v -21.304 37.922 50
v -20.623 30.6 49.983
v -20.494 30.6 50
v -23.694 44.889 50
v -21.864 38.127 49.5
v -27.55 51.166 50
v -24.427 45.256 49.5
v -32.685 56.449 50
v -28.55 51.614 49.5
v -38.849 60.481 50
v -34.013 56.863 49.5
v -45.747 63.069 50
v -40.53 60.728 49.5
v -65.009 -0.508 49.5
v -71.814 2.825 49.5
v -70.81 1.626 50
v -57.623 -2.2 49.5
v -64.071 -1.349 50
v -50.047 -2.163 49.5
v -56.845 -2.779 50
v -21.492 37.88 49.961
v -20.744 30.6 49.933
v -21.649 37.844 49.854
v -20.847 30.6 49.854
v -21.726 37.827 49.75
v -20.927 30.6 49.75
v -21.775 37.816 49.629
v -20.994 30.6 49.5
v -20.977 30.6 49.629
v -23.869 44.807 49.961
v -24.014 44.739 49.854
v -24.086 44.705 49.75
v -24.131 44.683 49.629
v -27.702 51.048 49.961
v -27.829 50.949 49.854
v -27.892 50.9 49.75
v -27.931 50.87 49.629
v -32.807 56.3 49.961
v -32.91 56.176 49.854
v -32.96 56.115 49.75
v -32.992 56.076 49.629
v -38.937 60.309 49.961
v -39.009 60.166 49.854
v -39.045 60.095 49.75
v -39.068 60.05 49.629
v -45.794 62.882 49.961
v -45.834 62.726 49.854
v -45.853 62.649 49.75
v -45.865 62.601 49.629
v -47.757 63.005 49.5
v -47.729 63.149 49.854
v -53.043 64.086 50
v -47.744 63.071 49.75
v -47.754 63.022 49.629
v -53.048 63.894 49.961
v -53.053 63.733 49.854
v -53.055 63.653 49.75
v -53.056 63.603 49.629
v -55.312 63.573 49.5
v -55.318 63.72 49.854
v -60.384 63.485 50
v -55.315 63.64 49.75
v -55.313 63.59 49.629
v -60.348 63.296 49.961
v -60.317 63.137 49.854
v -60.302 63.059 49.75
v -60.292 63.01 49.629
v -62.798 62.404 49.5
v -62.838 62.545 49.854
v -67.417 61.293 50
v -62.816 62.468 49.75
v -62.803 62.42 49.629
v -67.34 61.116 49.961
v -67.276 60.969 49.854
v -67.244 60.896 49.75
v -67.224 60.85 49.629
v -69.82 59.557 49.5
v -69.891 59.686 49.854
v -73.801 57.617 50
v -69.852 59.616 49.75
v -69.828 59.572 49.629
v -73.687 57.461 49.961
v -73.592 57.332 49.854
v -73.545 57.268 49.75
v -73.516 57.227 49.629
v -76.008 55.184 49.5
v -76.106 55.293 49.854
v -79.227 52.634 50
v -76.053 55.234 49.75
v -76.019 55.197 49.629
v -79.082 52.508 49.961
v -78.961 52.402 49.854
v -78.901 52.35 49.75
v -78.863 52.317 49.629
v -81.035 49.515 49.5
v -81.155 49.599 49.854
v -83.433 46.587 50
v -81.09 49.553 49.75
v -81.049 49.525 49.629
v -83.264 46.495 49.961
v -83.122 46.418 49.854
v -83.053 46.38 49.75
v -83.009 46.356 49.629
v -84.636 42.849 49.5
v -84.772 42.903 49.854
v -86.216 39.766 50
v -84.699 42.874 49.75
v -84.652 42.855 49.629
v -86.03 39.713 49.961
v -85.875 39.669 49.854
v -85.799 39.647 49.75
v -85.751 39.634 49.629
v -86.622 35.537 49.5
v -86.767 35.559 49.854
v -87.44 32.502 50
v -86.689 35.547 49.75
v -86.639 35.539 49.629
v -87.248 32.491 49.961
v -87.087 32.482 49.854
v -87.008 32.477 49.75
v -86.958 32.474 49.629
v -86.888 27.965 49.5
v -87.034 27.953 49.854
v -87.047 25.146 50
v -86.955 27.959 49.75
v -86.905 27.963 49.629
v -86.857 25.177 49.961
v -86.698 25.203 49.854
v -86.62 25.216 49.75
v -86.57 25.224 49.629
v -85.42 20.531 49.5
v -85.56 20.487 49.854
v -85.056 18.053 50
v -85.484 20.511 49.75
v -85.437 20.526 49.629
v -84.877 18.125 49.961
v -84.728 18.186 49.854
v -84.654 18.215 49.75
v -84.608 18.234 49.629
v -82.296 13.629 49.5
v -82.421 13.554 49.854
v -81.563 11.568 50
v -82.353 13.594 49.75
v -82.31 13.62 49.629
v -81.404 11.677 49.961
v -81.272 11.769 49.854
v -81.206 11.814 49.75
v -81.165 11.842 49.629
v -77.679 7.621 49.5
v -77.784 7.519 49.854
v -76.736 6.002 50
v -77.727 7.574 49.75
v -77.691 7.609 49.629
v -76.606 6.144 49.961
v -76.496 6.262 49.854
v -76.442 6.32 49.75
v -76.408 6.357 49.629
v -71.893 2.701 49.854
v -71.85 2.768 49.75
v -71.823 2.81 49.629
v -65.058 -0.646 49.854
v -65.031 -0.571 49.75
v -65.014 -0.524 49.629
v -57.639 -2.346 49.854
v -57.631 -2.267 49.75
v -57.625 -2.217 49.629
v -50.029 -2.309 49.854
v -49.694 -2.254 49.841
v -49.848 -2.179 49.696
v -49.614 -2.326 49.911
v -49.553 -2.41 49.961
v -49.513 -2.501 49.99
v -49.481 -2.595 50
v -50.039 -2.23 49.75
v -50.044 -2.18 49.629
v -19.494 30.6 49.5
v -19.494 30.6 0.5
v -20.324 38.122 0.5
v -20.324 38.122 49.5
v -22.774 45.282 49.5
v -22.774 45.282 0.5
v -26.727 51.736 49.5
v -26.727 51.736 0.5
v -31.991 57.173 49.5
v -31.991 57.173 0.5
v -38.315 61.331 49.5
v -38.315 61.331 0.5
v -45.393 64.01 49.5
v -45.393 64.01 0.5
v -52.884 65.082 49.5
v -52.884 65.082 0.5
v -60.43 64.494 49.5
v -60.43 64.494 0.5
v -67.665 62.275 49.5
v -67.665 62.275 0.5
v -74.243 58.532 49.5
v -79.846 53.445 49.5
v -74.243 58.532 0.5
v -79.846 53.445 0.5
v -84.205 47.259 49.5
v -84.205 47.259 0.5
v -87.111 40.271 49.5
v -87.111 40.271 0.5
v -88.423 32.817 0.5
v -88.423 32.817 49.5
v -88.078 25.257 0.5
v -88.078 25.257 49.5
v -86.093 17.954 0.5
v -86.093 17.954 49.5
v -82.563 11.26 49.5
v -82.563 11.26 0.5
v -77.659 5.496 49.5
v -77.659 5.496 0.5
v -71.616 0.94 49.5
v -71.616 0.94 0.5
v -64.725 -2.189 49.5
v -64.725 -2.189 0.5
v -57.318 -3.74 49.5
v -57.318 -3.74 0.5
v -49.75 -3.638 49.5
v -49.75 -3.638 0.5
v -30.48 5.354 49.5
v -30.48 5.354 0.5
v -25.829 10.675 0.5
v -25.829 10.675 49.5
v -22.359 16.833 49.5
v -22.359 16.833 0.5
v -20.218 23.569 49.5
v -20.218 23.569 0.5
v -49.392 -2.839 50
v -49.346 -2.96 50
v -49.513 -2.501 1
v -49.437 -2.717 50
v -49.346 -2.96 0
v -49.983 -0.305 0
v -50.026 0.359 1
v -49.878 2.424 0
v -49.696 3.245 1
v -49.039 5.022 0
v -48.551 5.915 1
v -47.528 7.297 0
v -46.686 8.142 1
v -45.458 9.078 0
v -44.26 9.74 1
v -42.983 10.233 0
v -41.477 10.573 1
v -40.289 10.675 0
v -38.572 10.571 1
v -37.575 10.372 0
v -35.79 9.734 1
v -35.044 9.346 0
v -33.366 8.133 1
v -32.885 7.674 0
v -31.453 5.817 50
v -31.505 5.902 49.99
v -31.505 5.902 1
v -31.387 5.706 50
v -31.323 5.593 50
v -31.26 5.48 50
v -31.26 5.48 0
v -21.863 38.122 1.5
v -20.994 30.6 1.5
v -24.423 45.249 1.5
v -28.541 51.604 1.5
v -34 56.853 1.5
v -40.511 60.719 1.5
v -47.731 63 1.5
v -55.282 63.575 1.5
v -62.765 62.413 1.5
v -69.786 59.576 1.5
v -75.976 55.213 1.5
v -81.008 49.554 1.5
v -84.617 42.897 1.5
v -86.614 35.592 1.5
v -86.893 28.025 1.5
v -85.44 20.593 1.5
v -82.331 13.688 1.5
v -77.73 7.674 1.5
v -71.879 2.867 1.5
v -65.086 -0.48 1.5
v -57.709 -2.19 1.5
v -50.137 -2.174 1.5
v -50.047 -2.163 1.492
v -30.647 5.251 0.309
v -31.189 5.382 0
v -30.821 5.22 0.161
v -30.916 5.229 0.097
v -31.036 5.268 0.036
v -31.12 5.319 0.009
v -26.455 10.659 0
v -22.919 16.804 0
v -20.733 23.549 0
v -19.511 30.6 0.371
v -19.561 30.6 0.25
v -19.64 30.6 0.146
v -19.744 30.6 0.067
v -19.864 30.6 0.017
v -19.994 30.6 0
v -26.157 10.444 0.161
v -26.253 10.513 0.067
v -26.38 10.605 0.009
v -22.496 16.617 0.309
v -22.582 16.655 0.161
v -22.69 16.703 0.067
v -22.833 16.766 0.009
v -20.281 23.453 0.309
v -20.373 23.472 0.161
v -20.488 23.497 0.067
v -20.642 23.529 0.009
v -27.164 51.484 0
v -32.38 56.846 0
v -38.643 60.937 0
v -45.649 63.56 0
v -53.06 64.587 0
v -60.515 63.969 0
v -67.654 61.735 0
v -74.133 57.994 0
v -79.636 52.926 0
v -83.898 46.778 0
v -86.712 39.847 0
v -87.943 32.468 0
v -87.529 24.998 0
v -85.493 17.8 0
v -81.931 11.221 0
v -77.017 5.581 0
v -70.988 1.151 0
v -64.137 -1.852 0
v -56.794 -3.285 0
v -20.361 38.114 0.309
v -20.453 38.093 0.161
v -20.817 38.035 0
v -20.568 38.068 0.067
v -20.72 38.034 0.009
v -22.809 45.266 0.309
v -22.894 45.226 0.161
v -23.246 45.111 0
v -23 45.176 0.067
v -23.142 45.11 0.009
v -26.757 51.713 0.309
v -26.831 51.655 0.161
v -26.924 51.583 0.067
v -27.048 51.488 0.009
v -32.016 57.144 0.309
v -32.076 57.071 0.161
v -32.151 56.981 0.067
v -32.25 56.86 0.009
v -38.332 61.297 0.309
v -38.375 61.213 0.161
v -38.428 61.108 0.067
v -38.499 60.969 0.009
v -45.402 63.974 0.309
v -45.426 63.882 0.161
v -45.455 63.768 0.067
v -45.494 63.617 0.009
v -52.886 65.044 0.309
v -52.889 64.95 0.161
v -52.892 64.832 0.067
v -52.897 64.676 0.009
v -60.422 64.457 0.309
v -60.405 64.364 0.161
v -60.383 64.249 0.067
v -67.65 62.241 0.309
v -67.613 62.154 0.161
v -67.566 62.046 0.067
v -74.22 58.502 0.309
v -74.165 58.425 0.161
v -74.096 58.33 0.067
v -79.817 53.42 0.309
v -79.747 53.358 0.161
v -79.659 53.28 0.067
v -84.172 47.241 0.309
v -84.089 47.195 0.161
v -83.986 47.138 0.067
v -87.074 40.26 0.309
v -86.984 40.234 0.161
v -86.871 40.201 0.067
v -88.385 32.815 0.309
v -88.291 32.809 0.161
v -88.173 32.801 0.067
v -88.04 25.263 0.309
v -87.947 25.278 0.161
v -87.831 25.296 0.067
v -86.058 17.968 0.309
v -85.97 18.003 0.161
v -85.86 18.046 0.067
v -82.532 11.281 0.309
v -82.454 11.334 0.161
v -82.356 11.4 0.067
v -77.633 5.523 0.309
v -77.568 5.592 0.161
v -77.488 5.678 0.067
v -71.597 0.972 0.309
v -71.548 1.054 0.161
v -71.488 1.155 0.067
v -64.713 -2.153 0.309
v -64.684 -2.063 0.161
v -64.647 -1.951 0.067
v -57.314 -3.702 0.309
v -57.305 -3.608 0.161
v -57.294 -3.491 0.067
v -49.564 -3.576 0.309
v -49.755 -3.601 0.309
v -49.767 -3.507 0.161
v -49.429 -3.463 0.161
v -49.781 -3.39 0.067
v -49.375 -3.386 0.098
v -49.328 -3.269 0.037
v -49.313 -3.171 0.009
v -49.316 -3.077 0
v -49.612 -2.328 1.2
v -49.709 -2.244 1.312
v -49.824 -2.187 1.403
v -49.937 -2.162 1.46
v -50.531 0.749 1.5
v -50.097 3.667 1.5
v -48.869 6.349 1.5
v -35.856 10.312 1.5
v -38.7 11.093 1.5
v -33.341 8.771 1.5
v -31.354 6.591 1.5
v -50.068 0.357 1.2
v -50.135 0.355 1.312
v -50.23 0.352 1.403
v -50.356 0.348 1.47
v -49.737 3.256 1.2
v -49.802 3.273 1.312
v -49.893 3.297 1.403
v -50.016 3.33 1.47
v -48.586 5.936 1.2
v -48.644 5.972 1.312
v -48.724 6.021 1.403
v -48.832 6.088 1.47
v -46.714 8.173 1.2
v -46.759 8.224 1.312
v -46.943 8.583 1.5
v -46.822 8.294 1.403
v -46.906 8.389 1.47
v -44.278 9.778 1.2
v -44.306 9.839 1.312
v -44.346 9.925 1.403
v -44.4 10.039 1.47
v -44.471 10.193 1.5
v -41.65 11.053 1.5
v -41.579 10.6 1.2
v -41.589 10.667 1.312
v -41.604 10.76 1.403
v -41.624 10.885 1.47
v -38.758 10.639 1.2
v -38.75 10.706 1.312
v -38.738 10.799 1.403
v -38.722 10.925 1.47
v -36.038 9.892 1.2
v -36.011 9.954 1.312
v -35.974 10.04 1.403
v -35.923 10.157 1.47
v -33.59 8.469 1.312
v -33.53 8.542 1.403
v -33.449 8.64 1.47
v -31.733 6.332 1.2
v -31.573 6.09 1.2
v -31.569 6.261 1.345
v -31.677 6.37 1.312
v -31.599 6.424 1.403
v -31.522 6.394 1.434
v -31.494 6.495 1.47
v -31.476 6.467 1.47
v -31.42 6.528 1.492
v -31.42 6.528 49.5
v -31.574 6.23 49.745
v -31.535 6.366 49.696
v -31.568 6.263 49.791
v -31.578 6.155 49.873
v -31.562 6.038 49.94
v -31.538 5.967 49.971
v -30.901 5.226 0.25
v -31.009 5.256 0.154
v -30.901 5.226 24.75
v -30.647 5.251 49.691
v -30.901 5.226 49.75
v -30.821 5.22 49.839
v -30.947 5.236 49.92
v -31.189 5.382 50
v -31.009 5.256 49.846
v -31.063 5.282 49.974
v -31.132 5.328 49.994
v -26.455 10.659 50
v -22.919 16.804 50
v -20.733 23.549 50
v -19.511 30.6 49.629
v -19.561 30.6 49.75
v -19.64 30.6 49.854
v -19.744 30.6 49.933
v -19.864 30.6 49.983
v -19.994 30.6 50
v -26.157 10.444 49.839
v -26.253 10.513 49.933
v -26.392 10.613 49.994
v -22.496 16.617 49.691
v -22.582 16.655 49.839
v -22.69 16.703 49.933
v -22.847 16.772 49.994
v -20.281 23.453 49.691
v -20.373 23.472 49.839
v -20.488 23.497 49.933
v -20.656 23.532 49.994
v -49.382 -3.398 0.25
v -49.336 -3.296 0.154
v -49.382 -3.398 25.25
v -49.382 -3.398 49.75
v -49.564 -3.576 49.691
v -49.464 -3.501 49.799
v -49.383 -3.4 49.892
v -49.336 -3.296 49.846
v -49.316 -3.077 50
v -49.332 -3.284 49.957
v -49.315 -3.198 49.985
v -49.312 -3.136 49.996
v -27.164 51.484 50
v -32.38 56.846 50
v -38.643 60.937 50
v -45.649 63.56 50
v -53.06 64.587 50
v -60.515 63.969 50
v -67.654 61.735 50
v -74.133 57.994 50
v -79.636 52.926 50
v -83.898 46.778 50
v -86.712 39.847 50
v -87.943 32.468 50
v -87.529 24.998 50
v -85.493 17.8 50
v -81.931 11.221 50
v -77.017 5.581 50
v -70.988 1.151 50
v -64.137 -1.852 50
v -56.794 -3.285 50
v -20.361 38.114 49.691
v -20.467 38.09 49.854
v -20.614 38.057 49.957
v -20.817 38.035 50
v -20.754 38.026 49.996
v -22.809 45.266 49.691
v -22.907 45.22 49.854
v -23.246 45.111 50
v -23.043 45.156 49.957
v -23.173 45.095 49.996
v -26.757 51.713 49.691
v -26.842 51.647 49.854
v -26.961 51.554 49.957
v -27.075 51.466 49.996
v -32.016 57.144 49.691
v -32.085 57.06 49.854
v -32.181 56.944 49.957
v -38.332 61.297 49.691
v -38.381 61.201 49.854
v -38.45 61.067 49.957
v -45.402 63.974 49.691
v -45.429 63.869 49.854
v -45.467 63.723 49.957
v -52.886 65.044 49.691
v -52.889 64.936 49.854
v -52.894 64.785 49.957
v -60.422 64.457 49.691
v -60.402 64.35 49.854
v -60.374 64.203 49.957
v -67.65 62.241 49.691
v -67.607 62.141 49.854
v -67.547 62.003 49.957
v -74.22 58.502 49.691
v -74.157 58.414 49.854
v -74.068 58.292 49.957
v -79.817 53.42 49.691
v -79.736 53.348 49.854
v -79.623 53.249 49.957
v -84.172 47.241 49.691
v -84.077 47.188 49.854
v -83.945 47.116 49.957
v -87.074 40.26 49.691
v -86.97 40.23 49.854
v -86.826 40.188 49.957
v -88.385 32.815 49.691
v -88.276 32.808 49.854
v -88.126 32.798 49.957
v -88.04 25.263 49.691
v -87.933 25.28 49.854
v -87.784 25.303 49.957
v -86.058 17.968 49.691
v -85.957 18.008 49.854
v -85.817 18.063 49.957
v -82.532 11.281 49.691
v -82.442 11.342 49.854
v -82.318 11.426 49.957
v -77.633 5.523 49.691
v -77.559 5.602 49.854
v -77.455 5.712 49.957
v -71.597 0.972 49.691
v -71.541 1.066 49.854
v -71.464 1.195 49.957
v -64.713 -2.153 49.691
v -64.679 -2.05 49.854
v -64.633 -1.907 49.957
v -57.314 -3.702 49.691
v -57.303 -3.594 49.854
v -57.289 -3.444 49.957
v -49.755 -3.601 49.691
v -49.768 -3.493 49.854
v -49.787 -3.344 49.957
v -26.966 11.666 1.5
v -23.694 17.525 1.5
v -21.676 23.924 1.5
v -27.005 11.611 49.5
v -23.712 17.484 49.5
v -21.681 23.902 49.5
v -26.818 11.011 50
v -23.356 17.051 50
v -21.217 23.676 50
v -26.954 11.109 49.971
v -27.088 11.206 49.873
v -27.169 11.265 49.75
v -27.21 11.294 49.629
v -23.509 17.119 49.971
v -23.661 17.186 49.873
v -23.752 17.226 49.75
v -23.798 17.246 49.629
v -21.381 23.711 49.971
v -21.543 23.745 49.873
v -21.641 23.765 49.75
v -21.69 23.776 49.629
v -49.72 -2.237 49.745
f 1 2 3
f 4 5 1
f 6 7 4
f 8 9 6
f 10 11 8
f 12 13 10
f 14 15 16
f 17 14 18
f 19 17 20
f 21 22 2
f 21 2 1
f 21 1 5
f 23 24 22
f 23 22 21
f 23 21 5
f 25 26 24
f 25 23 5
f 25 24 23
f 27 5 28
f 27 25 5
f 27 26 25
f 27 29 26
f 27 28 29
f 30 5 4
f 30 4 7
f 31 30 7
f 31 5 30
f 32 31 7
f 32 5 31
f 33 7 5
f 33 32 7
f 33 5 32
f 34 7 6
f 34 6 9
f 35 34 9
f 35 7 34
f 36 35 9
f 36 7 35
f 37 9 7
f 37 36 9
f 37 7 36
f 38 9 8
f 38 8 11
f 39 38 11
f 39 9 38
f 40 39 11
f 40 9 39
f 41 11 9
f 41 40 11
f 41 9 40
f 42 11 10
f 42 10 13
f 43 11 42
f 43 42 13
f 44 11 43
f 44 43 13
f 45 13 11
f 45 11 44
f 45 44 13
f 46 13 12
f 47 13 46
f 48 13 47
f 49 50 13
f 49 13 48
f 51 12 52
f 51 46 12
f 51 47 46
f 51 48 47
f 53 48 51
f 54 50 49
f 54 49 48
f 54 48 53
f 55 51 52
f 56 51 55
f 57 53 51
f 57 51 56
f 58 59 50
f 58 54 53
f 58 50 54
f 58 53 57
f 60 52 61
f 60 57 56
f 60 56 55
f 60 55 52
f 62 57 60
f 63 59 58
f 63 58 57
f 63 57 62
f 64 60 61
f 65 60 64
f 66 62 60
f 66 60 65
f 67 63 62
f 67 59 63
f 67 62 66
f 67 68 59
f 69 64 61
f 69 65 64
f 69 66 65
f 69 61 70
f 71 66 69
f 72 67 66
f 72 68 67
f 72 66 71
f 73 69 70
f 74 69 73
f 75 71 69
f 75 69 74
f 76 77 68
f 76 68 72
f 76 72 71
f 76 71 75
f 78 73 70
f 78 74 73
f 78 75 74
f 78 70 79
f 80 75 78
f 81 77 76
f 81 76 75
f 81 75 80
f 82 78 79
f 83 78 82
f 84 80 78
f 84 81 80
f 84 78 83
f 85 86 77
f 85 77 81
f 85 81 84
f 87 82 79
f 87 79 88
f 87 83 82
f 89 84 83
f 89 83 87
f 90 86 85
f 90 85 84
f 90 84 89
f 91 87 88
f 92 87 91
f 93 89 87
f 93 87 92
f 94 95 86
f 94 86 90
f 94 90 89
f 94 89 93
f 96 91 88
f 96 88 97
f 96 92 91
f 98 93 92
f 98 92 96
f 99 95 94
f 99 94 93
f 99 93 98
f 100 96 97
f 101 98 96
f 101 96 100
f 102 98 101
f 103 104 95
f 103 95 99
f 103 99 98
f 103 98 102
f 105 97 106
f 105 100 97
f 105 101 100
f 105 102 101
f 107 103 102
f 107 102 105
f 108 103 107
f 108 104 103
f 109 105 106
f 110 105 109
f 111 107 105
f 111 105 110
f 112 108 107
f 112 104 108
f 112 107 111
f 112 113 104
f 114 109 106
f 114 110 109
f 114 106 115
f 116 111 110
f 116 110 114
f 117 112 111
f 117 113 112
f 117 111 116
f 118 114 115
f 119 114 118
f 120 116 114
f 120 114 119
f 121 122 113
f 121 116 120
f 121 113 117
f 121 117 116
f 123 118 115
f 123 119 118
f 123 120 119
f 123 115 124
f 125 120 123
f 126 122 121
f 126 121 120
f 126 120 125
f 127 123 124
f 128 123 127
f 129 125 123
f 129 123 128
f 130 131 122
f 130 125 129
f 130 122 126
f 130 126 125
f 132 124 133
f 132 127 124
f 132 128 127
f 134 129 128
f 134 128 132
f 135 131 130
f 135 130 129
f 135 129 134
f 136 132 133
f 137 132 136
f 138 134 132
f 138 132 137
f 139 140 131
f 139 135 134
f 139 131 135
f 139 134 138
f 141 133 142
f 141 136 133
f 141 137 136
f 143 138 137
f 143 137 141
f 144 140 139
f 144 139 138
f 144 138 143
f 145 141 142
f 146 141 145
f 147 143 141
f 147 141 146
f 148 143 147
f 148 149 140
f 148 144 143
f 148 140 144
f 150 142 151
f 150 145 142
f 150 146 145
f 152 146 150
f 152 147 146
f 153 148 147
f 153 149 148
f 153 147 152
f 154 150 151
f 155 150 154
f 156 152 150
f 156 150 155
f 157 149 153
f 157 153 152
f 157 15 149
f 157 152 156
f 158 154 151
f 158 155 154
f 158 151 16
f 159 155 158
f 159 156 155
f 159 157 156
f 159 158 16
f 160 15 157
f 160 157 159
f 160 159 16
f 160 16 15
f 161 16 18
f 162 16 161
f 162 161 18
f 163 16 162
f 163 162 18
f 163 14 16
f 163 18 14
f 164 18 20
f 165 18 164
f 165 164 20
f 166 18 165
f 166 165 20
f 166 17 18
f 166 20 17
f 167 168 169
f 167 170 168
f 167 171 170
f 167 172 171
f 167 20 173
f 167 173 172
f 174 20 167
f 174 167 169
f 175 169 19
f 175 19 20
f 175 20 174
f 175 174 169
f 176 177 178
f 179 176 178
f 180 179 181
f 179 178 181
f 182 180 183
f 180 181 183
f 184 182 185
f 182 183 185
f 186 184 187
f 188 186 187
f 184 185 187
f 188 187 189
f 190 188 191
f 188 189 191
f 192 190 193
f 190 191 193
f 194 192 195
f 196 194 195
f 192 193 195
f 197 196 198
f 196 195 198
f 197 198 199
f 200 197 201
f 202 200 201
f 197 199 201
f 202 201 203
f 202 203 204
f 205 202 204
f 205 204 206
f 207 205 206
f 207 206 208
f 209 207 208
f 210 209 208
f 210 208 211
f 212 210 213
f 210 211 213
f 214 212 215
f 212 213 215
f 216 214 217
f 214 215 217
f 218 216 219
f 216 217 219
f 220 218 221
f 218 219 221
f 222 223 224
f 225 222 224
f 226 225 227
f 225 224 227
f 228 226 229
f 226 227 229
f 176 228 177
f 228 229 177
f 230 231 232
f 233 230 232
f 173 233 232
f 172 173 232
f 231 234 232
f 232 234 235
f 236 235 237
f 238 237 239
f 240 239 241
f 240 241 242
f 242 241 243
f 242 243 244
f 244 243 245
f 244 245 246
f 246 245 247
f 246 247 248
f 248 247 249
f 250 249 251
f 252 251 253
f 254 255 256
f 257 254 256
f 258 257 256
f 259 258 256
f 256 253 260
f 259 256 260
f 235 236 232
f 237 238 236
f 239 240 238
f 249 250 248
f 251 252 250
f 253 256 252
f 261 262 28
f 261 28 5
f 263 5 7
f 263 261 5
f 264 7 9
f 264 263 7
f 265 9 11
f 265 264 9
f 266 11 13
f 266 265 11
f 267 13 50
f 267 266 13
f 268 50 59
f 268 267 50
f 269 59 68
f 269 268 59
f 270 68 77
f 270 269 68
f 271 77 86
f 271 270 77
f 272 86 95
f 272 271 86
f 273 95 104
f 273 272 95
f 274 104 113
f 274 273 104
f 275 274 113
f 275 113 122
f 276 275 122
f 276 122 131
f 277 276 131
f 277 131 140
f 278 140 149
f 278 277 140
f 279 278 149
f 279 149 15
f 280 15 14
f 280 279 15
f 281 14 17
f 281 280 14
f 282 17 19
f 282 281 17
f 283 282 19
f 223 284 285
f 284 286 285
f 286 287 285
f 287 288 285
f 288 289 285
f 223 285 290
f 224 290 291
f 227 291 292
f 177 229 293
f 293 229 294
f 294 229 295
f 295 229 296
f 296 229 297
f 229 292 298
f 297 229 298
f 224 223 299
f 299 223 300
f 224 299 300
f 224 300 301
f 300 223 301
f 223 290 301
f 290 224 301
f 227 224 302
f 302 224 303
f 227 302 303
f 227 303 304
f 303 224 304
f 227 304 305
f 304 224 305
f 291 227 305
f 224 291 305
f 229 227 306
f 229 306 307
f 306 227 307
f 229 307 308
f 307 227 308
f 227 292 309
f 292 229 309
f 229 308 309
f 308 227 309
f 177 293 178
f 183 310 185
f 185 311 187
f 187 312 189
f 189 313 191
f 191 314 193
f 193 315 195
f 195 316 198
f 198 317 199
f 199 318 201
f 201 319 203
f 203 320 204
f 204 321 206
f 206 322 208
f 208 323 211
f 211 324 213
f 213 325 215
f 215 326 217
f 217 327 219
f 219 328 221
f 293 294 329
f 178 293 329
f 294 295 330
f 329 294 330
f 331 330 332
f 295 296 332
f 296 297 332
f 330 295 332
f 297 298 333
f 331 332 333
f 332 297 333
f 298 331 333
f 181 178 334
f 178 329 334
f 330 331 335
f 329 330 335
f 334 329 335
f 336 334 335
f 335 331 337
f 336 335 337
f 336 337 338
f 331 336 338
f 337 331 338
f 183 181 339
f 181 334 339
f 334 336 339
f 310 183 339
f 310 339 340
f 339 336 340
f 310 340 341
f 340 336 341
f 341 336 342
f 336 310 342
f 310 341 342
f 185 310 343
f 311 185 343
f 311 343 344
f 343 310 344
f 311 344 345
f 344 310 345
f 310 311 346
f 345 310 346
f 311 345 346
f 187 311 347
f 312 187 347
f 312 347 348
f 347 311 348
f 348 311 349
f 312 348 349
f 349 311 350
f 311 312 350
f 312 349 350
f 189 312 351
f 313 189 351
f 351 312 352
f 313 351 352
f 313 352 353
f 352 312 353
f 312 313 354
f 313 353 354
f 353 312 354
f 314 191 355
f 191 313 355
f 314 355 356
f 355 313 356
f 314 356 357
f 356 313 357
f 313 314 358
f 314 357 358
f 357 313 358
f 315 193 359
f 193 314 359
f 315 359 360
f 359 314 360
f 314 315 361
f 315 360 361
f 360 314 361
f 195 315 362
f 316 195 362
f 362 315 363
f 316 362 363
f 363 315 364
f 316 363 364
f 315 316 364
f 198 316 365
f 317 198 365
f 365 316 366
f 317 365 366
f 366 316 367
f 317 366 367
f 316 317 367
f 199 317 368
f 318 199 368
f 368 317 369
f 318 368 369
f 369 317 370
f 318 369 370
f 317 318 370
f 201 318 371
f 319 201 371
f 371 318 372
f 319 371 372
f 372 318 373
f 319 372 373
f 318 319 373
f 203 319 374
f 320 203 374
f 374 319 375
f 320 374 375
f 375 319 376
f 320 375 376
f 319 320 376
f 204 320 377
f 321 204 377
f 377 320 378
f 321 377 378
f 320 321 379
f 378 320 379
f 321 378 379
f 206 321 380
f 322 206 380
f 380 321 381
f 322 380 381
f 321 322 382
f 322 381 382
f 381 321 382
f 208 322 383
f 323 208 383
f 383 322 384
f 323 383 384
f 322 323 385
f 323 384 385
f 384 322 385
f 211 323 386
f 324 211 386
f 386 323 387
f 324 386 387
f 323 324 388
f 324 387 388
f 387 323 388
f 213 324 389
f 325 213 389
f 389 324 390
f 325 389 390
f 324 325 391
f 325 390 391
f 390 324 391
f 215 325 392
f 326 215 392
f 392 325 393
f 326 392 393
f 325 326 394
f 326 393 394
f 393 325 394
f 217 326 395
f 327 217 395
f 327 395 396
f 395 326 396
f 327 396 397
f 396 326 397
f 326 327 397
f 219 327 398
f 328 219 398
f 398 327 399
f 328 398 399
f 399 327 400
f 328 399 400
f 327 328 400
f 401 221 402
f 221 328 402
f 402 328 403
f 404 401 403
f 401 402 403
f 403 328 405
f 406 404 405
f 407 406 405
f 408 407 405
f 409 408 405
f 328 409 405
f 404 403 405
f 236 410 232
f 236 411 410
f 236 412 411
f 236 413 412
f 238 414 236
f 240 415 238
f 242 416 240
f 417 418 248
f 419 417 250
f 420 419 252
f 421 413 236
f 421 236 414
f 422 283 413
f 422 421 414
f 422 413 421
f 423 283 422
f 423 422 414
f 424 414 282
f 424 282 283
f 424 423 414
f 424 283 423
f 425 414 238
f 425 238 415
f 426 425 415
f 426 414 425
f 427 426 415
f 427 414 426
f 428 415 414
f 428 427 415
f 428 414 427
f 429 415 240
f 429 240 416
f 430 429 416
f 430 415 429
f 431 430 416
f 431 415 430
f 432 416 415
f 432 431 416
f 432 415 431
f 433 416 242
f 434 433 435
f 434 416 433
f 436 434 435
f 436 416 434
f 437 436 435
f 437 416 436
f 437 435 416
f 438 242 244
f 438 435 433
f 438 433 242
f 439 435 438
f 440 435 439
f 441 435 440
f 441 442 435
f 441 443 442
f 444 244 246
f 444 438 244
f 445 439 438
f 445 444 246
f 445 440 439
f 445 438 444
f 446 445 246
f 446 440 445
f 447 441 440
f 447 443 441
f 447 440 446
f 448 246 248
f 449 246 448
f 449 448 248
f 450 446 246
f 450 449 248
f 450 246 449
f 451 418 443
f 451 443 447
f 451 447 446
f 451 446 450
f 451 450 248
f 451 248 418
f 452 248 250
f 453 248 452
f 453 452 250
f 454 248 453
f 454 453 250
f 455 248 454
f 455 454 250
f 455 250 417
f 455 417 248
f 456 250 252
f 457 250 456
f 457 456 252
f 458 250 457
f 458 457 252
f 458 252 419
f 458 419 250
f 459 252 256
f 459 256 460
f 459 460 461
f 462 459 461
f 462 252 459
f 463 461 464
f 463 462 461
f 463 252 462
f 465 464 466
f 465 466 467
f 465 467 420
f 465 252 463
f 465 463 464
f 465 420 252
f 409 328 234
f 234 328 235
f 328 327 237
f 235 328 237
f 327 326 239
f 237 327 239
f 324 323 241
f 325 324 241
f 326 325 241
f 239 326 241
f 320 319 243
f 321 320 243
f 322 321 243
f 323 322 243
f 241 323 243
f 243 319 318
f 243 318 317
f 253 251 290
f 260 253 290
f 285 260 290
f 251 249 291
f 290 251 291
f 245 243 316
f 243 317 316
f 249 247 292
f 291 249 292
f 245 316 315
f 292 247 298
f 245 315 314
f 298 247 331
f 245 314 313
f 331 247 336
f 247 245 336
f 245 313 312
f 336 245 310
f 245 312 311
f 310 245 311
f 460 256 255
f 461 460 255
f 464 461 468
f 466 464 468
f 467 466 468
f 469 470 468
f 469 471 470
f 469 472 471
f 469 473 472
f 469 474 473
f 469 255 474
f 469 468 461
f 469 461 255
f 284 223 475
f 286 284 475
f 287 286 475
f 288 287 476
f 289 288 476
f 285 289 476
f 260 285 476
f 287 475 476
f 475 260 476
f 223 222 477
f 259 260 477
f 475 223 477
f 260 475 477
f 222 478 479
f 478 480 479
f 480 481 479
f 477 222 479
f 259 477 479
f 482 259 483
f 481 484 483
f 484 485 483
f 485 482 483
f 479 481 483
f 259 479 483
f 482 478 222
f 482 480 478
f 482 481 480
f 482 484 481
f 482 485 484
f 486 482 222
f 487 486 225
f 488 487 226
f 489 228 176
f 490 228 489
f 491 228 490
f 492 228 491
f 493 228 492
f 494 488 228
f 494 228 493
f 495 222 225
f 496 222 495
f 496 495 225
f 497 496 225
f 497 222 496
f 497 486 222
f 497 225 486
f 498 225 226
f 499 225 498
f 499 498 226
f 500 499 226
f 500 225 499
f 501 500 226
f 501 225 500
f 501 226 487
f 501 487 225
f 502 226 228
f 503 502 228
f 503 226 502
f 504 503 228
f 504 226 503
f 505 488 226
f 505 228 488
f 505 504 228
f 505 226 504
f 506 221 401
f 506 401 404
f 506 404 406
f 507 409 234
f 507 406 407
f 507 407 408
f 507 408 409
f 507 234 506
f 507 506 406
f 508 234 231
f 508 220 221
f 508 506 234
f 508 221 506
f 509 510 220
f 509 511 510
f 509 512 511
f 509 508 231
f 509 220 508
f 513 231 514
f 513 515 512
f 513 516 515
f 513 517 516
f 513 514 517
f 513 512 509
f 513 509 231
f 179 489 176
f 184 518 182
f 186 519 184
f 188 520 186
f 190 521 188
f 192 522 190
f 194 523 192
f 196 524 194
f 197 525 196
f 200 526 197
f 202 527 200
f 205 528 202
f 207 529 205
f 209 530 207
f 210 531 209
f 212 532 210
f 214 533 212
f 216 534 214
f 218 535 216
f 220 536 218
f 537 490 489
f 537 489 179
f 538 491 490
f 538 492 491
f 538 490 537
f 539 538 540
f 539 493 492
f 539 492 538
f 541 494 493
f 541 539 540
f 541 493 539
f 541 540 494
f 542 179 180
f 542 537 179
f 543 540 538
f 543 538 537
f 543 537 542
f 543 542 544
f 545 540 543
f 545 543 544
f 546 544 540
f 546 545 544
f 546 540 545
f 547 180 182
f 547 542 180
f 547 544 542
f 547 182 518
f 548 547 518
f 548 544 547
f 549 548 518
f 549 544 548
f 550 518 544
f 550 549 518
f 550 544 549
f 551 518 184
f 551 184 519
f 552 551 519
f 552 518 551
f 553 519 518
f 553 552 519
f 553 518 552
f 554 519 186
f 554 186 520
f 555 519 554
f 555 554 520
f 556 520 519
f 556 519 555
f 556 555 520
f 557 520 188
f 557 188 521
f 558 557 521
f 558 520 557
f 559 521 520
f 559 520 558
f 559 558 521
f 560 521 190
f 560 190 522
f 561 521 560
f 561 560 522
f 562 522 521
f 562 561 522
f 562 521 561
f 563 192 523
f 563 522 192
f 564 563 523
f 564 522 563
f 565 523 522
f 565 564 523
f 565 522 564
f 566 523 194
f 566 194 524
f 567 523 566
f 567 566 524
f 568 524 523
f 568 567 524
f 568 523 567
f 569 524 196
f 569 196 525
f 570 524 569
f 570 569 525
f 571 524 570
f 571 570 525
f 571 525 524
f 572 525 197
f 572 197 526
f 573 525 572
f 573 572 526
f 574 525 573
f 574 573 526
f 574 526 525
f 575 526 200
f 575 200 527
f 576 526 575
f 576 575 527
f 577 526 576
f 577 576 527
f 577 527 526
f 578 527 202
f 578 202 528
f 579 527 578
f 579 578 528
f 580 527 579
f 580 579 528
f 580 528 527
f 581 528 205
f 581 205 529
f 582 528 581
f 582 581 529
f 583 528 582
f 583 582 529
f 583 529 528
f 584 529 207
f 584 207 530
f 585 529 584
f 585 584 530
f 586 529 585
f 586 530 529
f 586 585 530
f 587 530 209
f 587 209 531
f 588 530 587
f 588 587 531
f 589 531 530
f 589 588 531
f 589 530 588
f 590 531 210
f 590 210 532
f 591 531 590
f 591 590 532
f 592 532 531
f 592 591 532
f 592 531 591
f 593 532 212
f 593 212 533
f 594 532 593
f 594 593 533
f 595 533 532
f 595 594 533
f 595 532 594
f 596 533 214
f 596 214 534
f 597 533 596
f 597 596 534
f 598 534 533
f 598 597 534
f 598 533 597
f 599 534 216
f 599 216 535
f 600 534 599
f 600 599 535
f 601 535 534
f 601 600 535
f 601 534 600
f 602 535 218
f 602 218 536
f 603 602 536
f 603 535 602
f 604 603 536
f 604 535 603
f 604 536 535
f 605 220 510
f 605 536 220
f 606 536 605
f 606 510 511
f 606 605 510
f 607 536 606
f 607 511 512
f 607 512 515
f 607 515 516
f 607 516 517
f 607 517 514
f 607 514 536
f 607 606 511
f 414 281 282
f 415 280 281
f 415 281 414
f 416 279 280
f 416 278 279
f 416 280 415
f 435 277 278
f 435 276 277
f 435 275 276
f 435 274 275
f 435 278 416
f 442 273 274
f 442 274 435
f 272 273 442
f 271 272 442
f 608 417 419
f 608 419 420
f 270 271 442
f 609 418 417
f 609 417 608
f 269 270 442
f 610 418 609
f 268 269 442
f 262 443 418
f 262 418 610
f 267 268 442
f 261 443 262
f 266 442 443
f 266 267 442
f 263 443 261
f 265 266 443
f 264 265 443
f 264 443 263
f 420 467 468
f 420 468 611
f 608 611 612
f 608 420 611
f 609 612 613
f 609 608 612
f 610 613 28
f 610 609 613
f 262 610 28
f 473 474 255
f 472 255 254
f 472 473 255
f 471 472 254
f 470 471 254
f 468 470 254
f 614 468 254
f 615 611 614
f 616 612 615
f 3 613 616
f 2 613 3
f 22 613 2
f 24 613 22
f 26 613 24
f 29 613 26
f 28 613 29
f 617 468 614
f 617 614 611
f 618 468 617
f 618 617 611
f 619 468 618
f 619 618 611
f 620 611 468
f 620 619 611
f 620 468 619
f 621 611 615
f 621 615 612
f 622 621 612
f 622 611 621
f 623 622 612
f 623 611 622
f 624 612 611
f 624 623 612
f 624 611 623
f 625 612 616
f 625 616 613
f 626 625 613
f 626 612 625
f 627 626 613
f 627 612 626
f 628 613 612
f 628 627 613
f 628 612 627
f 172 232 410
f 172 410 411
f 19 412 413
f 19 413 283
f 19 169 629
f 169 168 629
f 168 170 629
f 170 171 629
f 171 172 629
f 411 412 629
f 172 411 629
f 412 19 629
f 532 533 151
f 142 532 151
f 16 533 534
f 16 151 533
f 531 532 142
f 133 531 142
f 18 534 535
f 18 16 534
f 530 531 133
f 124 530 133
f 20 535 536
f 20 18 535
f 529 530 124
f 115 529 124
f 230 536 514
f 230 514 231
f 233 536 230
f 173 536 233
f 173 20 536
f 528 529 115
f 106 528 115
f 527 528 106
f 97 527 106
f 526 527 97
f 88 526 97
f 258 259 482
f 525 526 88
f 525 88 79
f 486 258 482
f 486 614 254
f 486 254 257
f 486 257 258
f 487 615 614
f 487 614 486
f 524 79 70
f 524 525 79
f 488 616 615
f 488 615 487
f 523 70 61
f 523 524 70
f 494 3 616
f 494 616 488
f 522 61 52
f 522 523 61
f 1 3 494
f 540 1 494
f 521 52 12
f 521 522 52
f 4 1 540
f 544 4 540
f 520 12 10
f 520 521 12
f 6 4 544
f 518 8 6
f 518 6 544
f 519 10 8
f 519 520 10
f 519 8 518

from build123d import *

# Parameters (mm, degrees)
F1_DEPTH = 50
F2_T     = -1.5
F3_R     = 0.5


with BuildPart() as f1:
    # F0 (on Top) → F1 (new body)
    with BuildSketch(Plane.XY):
        with BuildLine():
            ThreePointArc((-30.9694676058, 4.9068101727), (-22.4931361106, 16.5301319793), (-19.493863568, 30.599750654))
            ThreePointArc((-19.493863568, 30.599750654), (-80.0641317689, 53.196013972), (-49.0933485496, -3.5504316669))
            ThreePointArc((-49.0933485496, -3.5504316669), (-44.2600289976, 9.7401297248), (-30.9694676058, 4.9068101727))
        make_face()
    extrude(amount=F1_DEPTH)

    # F2
    f2_openings = [f1.faces().sort_by_distance(p)[0] for p in [
        (-54.609526, 31.919117, 50),
        (-44.260029, 9.74013, 25),
    ]]
    offset(amount=F2_T, openings=f2_openings)

    # F3
    f3_edges = [f1.edges().sort_by_distance(p)[0] for p in [
        (-68.582606, 61.863445, 50),
        (-67.948313, 60.504154, 50),
        (-49.634541, -2.111047, 25.75),
        (-30.969468, 4.90681, 25),
        (-31.724949, 6.2462, 25.75),
        (-44.260029, 9.74013, 1.5),
        (-68.582606, 61.863445, 0),
        (-49.093349, -3.550432, 25),
    ]]
    fillet(f3_edges, radius=F3_R)


solid = f1.part
